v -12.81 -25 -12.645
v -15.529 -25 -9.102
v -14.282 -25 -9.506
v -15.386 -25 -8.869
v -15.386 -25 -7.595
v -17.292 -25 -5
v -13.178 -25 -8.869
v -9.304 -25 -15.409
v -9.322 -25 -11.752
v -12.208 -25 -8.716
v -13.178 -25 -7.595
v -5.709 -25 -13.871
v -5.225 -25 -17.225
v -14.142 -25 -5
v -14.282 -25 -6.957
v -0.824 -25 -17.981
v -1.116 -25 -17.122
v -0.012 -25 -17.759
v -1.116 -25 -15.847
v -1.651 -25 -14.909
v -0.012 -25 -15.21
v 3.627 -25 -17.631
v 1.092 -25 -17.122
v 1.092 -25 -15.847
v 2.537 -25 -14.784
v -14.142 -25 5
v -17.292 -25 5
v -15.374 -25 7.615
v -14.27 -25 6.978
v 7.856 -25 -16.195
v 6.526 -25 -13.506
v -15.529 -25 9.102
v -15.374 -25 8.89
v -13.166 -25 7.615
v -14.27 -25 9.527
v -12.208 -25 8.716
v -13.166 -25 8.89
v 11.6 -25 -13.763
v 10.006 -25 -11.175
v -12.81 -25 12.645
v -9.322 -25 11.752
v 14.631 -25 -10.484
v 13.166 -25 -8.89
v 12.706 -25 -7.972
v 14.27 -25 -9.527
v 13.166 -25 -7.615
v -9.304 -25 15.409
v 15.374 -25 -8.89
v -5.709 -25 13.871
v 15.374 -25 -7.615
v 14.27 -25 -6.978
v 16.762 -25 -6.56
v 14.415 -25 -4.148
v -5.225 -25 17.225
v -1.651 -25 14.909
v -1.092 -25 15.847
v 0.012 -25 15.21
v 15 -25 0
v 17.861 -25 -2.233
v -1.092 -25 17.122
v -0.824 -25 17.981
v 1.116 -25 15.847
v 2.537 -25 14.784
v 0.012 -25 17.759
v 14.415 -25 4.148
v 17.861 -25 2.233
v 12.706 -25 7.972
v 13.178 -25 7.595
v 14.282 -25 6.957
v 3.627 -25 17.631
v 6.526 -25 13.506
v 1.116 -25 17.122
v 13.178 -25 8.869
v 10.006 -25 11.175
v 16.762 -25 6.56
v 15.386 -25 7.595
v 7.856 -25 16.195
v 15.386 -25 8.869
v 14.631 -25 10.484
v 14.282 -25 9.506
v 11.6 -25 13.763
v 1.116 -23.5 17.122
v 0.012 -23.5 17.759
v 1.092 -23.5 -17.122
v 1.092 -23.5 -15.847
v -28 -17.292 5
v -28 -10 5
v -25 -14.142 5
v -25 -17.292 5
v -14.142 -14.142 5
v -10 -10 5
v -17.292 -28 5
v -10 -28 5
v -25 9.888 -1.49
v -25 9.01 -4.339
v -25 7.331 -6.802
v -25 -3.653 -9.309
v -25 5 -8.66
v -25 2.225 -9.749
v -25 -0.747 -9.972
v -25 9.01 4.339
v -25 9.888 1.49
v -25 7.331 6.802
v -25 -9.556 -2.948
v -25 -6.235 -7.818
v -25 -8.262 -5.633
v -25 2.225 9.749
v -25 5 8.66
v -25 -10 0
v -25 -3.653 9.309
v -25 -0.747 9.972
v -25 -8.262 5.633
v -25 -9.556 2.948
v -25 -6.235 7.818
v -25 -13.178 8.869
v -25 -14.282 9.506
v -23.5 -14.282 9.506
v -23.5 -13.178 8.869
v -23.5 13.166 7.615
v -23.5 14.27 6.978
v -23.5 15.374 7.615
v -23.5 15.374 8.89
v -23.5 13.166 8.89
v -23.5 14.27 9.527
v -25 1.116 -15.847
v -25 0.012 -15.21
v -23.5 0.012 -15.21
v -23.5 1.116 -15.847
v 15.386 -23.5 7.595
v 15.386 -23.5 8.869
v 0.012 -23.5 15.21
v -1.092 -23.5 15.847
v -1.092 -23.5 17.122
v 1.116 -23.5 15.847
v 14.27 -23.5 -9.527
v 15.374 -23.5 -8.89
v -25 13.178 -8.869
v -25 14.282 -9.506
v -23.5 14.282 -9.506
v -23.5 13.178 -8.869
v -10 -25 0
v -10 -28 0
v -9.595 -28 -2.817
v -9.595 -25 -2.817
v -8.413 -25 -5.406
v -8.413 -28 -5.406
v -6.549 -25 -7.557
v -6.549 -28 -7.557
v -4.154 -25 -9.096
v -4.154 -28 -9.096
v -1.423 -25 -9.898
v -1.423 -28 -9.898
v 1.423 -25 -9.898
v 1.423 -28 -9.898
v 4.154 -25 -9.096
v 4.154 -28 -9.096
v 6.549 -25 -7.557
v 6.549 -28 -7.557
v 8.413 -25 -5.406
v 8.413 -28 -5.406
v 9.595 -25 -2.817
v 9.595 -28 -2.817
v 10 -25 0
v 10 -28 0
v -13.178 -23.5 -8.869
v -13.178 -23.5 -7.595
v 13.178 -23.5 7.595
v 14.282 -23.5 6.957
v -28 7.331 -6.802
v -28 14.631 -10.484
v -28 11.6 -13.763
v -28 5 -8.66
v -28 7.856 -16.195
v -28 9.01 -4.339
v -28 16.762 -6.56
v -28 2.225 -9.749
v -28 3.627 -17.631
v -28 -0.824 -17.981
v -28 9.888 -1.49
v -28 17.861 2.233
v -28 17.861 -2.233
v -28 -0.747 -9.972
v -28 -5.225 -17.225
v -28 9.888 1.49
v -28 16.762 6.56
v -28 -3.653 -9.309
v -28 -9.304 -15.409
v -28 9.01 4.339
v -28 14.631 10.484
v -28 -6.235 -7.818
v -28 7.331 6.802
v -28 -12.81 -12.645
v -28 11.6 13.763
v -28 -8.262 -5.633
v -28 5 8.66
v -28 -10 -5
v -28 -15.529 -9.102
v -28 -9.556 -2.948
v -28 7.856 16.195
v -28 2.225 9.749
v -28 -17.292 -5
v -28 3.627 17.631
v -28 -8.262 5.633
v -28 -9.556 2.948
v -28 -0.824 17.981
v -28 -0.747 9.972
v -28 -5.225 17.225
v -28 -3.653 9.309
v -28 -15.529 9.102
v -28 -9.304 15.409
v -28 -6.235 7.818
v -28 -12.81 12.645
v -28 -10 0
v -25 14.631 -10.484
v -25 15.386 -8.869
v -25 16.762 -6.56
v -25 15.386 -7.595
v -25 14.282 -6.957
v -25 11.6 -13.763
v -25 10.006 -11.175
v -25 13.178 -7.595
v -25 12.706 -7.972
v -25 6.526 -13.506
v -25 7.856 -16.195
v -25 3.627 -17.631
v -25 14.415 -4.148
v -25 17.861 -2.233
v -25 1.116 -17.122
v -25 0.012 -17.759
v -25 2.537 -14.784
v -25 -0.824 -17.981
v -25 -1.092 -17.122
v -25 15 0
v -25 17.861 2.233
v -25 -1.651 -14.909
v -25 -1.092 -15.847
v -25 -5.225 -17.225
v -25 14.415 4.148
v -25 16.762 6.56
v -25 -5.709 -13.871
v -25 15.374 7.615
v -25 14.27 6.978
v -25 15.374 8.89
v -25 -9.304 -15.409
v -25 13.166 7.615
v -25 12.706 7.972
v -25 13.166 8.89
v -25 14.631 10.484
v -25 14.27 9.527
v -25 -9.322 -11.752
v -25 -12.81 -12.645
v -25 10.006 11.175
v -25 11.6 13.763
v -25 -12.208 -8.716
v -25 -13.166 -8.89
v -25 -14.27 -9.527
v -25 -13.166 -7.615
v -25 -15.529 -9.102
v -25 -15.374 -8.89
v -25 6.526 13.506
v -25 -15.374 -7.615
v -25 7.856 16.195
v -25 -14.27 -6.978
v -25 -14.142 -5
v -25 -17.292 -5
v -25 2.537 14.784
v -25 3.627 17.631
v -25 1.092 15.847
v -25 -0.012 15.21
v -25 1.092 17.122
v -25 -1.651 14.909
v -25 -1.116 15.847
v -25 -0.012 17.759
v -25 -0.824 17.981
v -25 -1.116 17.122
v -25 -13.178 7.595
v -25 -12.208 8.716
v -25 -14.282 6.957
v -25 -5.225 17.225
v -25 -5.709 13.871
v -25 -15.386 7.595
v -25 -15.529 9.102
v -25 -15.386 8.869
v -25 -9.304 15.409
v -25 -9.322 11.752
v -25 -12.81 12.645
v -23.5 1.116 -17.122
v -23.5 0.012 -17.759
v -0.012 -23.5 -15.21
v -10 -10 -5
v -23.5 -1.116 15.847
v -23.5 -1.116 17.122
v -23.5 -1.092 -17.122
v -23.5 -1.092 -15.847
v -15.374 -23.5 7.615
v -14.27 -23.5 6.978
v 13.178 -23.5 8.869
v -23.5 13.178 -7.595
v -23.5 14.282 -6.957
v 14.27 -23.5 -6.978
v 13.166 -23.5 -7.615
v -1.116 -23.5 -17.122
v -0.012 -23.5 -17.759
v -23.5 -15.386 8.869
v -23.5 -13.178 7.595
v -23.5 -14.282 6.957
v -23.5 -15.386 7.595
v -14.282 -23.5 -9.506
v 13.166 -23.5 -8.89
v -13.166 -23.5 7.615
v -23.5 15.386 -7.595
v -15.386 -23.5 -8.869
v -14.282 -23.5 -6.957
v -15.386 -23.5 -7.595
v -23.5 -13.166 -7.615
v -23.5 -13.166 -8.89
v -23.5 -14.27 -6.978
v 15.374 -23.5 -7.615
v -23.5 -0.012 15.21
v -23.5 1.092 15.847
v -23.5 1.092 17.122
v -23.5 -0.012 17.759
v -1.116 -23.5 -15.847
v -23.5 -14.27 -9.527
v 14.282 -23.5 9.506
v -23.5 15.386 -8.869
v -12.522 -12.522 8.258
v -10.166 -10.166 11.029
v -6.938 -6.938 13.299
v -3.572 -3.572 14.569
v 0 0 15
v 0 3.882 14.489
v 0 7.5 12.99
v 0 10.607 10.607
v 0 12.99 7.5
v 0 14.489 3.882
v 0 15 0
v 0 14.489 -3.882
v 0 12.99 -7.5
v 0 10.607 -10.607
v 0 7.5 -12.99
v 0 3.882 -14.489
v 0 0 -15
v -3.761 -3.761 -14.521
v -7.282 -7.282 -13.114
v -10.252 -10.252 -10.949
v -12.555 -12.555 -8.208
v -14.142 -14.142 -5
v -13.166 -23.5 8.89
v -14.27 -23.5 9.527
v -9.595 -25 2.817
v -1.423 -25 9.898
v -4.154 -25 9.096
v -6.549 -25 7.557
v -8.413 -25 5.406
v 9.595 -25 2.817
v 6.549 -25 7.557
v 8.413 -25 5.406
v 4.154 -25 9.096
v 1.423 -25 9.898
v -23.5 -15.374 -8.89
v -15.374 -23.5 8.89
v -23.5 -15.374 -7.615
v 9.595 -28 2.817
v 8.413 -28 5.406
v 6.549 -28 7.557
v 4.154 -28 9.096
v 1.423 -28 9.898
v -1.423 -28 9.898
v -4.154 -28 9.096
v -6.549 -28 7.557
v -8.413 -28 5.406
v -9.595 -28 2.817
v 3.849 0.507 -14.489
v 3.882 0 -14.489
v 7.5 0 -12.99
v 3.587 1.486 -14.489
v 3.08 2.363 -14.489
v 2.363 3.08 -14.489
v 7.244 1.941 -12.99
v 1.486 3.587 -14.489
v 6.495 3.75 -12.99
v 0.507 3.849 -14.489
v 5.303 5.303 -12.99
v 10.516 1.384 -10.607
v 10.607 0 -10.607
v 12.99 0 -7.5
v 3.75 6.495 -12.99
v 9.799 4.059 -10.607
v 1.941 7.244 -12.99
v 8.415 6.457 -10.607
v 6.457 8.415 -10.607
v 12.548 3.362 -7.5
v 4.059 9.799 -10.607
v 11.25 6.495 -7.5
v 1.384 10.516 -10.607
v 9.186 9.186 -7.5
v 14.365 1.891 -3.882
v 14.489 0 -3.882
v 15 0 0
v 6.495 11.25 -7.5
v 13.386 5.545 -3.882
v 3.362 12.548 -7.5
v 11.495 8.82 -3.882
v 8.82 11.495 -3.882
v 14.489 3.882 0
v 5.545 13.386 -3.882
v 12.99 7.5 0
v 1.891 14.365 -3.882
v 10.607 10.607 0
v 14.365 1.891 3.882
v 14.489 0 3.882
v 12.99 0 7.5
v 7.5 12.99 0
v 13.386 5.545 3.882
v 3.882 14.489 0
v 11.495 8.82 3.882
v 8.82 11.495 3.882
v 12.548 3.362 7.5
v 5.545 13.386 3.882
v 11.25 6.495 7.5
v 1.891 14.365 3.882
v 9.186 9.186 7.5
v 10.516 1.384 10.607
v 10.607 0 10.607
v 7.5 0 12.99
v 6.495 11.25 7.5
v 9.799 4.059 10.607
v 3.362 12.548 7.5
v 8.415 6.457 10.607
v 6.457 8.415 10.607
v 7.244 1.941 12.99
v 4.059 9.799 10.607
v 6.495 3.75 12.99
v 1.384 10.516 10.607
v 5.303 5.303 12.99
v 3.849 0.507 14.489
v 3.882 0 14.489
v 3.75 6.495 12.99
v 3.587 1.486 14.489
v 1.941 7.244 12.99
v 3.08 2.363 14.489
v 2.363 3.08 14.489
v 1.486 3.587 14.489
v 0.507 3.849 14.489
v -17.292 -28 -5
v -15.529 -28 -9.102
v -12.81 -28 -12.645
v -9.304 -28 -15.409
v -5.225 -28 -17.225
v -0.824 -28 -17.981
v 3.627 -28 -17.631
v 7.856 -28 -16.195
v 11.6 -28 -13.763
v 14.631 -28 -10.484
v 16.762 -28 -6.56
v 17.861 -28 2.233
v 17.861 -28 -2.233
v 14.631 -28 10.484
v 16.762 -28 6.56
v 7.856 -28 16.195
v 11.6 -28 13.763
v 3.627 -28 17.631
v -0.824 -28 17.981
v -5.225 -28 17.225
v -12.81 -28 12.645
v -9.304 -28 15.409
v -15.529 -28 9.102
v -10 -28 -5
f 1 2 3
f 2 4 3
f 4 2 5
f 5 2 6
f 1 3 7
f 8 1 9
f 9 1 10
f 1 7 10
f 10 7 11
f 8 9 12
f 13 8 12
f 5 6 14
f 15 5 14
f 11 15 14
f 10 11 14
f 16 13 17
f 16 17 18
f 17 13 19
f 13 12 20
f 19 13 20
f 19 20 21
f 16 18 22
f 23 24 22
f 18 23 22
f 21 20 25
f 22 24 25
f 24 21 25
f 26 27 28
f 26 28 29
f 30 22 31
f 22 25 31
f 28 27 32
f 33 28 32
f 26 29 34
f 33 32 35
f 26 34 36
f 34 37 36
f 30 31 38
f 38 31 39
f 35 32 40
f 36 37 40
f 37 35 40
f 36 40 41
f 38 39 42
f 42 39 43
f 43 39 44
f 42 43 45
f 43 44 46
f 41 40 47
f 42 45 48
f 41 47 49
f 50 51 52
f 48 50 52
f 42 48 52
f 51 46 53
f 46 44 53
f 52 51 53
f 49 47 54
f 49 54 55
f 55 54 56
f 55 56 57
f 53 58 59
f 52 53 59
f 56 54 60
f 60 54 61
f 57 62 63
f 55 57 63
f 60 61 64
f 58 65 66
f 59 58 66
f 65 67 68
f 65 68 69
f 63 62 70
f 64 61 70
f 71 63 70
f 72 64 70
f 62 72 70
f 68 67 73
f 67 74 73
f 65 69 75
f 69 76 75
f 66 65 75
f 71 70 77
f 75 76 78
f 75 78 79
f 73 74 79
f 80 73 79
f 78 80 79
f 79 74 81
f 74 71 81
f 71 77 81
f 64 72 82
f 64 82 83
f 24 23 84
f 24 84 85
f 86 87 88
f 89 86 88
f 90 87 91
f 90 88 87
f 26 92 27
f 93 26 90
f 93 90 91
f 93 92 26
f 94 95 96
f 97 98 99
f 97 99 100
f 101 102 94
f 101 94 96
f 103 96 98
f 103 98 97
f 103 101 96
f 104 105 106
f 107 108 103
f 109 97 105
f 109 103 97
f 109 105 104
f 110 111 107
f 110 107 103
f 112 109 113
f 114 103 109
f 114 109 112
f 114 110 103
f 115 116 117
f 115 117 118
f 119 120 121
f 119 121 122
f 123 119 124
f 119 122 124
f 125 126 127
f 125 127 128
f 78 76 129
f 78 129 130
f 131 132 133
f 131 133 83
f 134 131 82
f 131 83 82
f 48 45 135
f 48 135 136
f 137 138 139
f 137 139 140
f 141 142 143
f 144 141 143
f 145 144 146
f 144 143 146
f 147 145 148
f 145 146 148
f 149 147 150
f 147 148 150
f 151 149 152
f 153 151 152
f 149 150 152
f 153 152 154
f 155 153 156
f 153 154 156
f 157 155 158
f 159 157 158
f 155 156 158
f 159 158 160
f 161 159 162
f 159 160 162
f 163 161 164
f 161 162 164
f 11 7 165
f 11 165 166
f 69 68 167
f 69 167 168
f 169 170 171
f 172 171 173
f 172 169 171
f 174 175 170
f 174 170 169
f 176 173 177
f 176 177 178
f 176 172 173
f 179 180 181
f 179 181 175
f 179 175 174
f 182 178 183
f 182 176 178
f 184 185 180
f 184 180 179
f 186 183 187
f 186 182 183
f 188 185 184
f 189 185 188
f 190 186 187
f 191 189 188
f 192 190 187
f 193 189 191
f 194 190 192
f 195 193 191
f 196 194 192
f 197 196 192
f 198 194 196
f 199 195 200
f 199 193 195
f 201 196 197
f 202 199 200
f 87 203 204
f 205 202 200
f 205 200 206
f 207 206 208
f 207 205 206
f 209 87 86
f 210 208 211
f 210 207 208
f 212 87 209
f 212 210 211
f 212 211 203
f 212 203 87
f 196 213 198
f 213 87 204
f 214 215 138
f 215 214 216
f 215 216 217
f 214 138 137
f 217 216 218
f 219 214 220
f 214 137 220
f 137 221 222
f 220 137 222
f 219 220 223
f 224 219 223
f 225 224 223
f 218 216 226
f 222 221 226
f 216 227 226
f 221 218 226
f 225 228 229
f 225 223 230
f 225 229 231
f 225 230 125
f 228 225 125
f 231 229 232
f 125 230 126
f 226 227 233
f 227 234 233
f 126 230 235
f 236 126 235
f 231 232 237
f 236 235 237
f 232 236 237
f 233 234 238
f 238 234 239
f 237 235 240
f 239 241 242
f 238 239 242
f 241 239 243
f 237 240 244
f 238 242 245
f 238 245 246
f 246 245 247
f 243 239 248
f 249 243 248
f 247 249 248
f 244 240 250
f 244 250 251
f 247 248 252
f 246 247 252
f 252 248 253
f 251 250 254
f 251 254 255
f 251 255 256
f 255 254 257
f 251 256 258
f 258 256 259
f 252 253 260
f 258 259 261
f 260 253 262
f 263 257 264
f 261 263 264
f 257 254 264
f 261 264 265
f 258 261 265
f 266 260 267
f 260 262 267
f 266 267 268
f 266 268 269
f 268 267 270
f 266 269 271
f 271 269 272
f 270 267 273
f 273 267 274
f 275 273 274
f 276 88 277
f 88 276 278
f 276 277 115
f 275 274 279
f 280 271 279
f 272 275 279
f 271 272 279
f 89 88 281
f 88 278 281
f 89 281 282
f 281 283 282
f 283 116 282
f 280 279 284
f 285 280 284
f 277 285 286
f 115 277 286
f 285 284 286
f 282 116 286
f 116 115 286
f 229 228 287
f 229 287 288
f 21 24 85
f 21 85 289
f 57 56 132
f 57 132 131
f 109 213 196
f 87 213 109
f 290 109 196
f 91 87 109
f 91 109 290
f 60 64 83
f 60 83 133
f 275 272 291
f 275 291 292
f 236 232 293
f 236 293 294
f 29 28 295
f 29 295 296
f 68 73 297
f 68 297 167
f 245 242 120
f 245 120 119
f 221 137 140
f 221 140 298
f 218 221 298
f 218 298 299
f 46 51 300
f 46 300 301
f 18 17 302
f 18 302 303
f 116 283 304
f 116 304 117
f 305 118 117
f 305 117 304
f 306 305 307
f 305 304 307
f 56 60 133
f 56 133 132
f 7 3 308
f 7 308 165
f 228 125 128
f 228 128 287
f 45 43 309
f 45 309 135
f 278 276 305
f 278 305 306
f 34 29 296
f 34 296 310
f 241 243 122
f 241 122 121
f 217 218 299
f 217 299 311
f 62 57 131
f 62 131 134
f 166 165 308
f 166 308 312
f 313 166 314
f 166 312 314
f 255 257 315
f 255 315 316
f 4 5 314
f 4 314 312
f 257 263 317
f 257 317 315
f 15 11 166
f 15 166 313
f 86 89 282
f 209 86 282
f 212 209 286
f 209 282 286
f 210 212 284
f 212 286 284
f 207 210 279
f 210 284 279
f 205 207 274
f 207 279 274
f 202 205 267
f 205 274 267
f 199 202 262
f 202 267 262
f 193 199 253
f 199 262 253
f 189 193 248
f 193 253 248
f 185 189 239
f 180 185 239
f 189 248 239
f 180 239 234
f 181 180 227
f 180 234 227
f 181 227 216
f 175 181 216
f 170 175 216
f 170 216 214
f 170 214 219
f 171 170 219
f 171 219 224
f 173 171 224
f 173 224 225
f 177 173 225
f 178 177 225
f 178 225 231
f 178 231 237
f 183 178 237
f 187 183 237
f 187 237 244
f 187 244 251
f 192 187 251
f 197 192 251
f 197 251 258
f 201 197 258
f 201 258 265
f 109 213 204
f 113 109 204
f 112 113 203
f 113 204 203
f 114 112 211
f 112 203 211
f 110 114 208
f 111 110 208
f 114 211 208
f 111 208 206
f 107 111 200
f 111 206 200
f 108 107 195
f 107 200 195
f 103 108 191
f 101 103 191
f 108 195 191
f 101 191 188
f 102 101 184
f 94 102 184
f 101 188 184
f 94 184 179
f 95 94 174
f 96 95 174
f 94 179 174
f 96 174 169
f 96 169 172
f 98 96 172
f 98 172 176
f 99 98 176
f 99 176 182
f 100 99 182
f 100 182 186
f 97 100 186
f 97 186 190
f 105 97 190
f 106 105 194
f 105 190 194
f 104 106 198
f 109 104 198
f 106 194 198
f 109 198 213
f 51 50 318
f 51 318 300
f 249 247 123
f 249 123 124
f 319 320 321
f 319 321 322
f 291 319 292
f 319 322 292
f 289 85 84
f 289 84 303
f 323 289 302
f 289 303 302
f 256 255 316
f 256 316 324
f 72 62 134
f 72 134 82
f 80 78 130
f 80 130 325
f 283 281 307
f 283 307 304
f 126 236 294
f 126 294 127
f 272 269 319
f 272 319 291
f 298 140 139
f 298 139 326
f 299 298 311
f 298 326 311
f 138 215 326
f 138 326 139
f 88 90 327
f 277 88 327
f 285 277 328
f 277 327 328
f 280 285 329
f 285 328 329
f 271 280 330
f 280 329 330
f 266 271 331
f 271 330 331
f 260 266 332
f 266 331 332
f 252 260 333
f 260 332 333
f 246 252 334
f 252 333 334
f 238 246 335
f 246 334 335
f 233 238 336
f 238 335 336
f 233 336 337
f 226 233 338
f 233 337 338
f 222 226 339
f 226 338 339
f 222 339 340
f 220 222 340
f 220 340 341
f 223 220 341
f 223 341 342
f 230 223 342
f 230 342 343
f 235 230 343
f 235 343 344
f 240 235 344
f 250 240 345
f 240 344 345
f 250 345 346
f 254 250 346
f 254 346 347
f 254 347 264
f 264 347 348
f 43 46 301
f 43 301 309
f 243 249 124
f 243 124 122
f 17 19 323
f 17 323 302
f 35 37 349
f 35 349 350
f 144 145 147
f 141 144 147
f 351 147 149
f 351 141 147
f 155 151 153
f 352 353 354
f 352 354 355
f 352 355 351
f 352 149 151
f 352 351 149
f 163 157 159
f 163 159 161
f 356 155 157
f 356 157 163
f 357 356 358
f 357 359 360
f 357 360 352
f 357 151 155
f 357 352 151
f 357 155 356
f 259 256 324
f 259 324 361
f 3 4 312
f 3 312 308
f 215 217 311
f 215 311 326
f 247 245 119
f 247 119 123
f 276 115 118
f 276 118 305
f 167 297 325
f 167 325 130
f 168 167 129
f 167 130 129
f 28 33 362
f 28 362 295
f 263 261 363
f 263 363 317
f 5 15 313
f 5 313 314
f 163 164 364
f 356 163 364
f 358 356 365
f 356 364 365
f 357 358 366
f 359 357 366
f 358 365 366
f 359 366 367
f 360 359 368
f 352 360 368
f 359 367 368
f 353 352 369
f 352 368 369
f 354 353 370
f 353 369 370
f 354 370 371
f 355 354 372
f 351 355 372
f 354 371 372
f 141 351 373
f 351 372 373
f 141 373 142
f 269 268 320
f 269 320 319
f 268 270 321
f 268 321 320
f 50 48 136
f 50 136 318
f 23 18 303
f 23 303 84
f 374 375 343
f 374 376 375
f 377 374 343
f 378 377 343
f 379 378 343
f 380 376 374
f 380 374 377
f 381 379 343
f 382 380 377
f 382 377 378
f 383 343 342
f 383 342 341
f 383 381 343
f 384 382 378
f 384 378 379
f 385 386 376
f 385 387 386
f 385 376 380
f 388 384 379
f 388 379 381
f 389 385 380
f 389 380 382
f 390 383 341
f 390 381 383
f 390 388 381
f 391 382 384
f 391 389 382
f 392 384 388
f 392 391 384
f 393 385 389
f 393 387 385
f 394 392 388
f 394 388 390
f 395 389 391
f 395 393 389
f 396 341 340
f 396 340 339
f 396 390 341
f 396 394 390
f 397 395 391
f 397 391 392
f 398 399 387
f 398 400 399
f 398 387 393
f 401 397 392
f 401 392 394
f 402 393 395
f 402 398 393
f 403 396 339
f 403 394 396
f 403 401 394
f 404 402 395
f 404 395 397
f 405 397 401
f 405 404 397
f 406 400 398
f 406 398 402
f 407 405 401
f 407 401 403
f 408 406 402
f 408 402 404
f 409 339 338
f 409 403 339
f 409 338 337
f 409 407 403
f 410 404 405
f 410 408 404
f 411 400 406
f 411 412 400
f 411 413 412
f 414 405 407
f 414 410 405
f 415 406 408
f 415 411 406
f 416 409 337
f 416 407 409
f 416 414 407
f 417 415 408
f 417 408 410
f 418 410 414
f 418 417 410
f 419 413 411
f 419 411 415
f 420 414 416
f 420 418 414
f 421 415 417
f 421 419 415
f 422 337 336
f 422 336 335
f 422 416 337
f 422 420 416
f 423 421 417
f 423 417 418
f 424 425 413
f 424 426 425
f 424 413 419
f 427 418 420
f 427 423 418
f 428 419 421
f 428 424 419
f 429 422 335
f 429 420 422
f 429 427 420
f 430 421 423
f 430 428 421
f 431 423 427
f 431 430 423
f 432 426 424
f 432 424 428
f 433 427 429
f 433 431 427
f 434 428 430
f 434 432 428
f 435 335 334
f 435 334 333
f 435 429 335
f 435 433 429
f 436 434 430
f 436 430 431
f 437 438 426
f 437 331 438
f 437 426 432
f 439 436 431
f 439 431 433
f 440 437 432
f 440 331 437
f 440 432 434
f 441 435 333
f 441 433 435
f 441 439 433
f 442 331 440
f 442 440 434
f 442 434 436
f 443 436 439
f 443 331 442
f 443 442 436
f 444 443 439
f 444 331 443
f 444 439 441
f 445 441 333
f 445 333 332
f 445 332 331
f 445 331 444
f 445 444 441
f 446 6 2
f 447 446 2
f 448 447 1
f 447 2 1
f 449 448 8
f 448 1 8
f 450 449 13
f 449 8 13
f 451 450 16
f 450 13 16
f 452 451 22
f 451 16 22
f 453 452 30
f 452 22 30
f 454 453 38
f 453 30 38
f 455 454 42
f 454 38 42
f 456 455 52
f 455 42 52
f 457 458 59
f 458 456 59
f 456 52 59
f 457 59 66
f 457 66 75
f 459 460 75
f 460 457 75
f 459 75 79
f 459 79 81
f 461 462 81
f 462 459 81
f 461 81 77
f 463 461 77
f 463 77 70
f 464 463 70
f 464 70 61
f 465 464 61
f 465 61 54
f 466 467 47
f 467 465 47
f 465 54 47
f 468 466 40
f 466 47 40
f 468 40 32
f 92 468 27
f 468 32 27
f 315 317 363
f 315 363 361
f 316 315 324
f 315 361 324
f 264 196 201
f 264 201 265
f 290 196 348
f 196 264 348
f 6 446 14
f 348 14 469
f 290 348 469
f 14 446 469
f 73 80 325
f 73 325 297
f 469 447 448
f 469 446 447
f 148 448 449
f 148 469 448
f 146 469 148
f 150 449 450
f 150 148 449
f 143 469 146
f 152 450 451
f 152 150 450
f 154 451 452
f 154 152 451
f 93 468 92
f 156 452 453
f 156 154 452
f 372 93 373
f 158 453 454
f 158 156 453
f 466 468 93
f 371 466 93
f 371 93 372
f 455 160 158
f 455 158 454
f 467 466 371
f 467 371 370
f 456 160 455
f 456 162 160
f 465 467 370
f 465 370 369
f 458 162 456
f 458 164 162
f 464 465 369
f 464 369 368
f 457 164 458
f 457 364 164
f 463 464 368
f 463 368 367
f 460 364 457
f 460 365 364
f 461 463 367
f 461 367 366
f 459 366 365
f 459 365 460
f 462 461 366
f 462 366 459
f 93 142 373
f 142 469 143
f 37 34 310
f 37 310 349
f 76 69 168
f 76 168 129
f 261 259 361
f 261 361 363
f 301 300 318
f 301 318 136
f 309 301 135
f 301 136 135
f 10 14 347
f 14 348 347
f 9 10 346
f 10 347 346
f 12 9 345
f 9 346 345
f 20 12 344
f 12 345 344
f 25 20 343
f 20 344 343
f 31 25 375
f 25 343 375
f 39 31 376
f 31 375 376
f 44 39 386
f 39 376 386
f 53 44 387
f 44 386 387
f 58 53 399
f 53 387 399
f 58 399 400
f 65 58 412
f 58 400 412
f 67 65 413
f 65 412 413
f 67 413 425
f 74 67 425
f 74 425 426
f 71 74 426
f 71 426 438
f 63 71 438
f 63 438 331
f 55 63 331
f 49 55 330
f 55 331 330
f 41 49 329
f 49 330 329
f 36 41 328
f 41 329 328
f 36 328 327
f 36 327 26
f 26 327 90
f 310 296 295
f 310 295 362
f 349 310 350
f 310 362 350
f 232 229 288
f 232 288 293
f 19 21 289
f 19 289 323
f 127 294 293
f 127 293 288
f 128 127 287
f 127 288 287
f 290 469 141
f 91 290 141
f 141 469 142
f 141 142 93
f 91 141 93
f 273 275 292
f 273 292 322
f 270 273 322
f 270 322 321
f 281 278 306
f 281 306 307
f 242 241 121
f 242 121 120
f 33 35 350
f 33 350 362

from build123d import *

# Parameters (mm, degrees)
SPHERE_ANGLE          = 90
SKETCH_R              = 15
PAD_DEPTH             = 25
SKETCH001_R           = 15
PAD001_DEPTH          = 25
SKETCH002_R           = 18
PAD002_DEPTH          = 3
SKETCH003_R           = 18
PAD003_DEPTH          = 3
PAD004_DEPTH          = 1.5
POLARPATTERN_COUNT    = 6
PAD005_DEPTH          = 1.5
POLARPATTERN001_COUNT = 6
SKETCH010_W           = 18
SKETCH010_H           = 10
POCKET_DEPTH          = 18
SKETCH011_R           = 10
POCKET001_DEPTH       = 3
SKETCH012_R           = 10
POCKET002_DEPTH       = 3


with BuildPart() as part:
    # Sphere → Sphere (revolve)
    with BuildSketch(Plane.XZ):
        with BuildLine():
            ThreePointArc((0, -15), (15, 0), (0, 15))
            Line((0, 15), (0, -15))
        make_face()
    revolve(axis=Axis((0, 0, 0), (0, 0, 1)), revolution_arc=SPHERE_ANGLE)

    # Sketch (on Face2 of Sphere) → Pad (new body)
    with BuildSketch(Plane.XZ):
        Circle(SKETCH_R)
    extrude(amount=PAD_DEPTH)

    # Sketch001 (on Face2 of Pad) → Pad001 (join)
    with BuildSketch(Plane(origin=(0, 0, 0), x_dir=(0, -1, 0), z_dir=(-1, 0, 0))):
        Circle(SKETCH001_R)
    extrude(amount=PAD001_DEPTH)

    # Sketch002 (on Face4 of Pad001) → Pad002 (join)
    with BuildSketch(Plane(origin=(-25, 0, 0), x_dir=(0, -1, 0), z_dir=(-1, 0, 0))):
        Circle(SKETCH002_R)
    extrude(amount=PAD002_DEPTH)

    # Sketch003 (on Face7 of Pad002) → Pad003 (join)
    with BuildSketch(Plane.XZ.offset(25)):
        Circle(SKETCH003_R)
    extrude(amount=PAD003_DEPTH)

    # Sketch004 (on Face2 of Pad003) → Pad004 (join)
    with BuildSketch(Plane(origin=(0, -25, 0), x_dir=(-1, 0, 0), z_dir=(0, 1, 0))):
        Polygon((-1.11579, 17.121659), (-0.012041, 17.758909), (1.091708, 17.121659), (1.091708, 15.84716), (-0.012041, 15.209911), (-1.11579, 15.84716), align=None)
    pad004 = extrude(amount=PAD004_DEPTH)

    # PolarPattern: Pad004 ×6 about axis
    polarpattern_axis = Axis((0, -25, 0), (0, 1, 0))
    for i in range(1, POLARPATTERN_COUNT):
        add(pad004.rotate(polarpattern_axis, i * 360 / POLARPATTERN_COUNT))

    # Sketch009 (on Face49 of PolarPattern) → Pad005 (join)
    with BuildSketch(Plane.YZ.offset(-25)):
        Polygon((-1.11579, 17.121659), (-0.012041, 17.758909), (1.091708, 17.121659), (1.091708, 15.84716), (-0.012041, 15.209911), (-1.11579, 15.84716), align=None)
    pad005 = extrude(amount=PAD005_DEPTH)

    # PolarPattern001: Pad005 ×6 about axis
    polarpattern001_axis = Axis((-25, 0, 0), (1, 0, 0))
    for i in range(1, POLARPATTERN001_COUNT):
        add(pad005.rotate(polarpattern001_axis, i * 360 / POLARPATTERN001_COUNT))

    # Sketch010 (on Face3 of PolarPattern001) → Pocket (cut)
    with BuildSketch(Plane.XZ.offset(28)):
        with Locations((-19, 0)):
            Rectangle(SKETCH010_W, SKETCH010_H)
    extrude(amount=-POCKET_DEPTH, mode=Mode.SUBTRACT)

    # Sketch011 (on Face4 of Pocket) → Pocket001 (cut)
    with BuildSketch(Plane.XZ.offset(28)):
        Circle(SKETCH011_R)
    extrude(amount=-POCKET001_DEPTH, mode=Mode.SUBTRACT)

    # Sketch012 (on Face50 of Pocket001) → Pocket002 (cut)
    with BuildSketch(Plane(origin=(-28, 0, 0), x_dir=(0, -1, 0), z_dir=(-1, 0, 0))):
        Circle(SKETCH012_R)
    extrude(amount=-POCKET002_DEPTH, mode=Mode.SUBTRACT)


solid = part.part
